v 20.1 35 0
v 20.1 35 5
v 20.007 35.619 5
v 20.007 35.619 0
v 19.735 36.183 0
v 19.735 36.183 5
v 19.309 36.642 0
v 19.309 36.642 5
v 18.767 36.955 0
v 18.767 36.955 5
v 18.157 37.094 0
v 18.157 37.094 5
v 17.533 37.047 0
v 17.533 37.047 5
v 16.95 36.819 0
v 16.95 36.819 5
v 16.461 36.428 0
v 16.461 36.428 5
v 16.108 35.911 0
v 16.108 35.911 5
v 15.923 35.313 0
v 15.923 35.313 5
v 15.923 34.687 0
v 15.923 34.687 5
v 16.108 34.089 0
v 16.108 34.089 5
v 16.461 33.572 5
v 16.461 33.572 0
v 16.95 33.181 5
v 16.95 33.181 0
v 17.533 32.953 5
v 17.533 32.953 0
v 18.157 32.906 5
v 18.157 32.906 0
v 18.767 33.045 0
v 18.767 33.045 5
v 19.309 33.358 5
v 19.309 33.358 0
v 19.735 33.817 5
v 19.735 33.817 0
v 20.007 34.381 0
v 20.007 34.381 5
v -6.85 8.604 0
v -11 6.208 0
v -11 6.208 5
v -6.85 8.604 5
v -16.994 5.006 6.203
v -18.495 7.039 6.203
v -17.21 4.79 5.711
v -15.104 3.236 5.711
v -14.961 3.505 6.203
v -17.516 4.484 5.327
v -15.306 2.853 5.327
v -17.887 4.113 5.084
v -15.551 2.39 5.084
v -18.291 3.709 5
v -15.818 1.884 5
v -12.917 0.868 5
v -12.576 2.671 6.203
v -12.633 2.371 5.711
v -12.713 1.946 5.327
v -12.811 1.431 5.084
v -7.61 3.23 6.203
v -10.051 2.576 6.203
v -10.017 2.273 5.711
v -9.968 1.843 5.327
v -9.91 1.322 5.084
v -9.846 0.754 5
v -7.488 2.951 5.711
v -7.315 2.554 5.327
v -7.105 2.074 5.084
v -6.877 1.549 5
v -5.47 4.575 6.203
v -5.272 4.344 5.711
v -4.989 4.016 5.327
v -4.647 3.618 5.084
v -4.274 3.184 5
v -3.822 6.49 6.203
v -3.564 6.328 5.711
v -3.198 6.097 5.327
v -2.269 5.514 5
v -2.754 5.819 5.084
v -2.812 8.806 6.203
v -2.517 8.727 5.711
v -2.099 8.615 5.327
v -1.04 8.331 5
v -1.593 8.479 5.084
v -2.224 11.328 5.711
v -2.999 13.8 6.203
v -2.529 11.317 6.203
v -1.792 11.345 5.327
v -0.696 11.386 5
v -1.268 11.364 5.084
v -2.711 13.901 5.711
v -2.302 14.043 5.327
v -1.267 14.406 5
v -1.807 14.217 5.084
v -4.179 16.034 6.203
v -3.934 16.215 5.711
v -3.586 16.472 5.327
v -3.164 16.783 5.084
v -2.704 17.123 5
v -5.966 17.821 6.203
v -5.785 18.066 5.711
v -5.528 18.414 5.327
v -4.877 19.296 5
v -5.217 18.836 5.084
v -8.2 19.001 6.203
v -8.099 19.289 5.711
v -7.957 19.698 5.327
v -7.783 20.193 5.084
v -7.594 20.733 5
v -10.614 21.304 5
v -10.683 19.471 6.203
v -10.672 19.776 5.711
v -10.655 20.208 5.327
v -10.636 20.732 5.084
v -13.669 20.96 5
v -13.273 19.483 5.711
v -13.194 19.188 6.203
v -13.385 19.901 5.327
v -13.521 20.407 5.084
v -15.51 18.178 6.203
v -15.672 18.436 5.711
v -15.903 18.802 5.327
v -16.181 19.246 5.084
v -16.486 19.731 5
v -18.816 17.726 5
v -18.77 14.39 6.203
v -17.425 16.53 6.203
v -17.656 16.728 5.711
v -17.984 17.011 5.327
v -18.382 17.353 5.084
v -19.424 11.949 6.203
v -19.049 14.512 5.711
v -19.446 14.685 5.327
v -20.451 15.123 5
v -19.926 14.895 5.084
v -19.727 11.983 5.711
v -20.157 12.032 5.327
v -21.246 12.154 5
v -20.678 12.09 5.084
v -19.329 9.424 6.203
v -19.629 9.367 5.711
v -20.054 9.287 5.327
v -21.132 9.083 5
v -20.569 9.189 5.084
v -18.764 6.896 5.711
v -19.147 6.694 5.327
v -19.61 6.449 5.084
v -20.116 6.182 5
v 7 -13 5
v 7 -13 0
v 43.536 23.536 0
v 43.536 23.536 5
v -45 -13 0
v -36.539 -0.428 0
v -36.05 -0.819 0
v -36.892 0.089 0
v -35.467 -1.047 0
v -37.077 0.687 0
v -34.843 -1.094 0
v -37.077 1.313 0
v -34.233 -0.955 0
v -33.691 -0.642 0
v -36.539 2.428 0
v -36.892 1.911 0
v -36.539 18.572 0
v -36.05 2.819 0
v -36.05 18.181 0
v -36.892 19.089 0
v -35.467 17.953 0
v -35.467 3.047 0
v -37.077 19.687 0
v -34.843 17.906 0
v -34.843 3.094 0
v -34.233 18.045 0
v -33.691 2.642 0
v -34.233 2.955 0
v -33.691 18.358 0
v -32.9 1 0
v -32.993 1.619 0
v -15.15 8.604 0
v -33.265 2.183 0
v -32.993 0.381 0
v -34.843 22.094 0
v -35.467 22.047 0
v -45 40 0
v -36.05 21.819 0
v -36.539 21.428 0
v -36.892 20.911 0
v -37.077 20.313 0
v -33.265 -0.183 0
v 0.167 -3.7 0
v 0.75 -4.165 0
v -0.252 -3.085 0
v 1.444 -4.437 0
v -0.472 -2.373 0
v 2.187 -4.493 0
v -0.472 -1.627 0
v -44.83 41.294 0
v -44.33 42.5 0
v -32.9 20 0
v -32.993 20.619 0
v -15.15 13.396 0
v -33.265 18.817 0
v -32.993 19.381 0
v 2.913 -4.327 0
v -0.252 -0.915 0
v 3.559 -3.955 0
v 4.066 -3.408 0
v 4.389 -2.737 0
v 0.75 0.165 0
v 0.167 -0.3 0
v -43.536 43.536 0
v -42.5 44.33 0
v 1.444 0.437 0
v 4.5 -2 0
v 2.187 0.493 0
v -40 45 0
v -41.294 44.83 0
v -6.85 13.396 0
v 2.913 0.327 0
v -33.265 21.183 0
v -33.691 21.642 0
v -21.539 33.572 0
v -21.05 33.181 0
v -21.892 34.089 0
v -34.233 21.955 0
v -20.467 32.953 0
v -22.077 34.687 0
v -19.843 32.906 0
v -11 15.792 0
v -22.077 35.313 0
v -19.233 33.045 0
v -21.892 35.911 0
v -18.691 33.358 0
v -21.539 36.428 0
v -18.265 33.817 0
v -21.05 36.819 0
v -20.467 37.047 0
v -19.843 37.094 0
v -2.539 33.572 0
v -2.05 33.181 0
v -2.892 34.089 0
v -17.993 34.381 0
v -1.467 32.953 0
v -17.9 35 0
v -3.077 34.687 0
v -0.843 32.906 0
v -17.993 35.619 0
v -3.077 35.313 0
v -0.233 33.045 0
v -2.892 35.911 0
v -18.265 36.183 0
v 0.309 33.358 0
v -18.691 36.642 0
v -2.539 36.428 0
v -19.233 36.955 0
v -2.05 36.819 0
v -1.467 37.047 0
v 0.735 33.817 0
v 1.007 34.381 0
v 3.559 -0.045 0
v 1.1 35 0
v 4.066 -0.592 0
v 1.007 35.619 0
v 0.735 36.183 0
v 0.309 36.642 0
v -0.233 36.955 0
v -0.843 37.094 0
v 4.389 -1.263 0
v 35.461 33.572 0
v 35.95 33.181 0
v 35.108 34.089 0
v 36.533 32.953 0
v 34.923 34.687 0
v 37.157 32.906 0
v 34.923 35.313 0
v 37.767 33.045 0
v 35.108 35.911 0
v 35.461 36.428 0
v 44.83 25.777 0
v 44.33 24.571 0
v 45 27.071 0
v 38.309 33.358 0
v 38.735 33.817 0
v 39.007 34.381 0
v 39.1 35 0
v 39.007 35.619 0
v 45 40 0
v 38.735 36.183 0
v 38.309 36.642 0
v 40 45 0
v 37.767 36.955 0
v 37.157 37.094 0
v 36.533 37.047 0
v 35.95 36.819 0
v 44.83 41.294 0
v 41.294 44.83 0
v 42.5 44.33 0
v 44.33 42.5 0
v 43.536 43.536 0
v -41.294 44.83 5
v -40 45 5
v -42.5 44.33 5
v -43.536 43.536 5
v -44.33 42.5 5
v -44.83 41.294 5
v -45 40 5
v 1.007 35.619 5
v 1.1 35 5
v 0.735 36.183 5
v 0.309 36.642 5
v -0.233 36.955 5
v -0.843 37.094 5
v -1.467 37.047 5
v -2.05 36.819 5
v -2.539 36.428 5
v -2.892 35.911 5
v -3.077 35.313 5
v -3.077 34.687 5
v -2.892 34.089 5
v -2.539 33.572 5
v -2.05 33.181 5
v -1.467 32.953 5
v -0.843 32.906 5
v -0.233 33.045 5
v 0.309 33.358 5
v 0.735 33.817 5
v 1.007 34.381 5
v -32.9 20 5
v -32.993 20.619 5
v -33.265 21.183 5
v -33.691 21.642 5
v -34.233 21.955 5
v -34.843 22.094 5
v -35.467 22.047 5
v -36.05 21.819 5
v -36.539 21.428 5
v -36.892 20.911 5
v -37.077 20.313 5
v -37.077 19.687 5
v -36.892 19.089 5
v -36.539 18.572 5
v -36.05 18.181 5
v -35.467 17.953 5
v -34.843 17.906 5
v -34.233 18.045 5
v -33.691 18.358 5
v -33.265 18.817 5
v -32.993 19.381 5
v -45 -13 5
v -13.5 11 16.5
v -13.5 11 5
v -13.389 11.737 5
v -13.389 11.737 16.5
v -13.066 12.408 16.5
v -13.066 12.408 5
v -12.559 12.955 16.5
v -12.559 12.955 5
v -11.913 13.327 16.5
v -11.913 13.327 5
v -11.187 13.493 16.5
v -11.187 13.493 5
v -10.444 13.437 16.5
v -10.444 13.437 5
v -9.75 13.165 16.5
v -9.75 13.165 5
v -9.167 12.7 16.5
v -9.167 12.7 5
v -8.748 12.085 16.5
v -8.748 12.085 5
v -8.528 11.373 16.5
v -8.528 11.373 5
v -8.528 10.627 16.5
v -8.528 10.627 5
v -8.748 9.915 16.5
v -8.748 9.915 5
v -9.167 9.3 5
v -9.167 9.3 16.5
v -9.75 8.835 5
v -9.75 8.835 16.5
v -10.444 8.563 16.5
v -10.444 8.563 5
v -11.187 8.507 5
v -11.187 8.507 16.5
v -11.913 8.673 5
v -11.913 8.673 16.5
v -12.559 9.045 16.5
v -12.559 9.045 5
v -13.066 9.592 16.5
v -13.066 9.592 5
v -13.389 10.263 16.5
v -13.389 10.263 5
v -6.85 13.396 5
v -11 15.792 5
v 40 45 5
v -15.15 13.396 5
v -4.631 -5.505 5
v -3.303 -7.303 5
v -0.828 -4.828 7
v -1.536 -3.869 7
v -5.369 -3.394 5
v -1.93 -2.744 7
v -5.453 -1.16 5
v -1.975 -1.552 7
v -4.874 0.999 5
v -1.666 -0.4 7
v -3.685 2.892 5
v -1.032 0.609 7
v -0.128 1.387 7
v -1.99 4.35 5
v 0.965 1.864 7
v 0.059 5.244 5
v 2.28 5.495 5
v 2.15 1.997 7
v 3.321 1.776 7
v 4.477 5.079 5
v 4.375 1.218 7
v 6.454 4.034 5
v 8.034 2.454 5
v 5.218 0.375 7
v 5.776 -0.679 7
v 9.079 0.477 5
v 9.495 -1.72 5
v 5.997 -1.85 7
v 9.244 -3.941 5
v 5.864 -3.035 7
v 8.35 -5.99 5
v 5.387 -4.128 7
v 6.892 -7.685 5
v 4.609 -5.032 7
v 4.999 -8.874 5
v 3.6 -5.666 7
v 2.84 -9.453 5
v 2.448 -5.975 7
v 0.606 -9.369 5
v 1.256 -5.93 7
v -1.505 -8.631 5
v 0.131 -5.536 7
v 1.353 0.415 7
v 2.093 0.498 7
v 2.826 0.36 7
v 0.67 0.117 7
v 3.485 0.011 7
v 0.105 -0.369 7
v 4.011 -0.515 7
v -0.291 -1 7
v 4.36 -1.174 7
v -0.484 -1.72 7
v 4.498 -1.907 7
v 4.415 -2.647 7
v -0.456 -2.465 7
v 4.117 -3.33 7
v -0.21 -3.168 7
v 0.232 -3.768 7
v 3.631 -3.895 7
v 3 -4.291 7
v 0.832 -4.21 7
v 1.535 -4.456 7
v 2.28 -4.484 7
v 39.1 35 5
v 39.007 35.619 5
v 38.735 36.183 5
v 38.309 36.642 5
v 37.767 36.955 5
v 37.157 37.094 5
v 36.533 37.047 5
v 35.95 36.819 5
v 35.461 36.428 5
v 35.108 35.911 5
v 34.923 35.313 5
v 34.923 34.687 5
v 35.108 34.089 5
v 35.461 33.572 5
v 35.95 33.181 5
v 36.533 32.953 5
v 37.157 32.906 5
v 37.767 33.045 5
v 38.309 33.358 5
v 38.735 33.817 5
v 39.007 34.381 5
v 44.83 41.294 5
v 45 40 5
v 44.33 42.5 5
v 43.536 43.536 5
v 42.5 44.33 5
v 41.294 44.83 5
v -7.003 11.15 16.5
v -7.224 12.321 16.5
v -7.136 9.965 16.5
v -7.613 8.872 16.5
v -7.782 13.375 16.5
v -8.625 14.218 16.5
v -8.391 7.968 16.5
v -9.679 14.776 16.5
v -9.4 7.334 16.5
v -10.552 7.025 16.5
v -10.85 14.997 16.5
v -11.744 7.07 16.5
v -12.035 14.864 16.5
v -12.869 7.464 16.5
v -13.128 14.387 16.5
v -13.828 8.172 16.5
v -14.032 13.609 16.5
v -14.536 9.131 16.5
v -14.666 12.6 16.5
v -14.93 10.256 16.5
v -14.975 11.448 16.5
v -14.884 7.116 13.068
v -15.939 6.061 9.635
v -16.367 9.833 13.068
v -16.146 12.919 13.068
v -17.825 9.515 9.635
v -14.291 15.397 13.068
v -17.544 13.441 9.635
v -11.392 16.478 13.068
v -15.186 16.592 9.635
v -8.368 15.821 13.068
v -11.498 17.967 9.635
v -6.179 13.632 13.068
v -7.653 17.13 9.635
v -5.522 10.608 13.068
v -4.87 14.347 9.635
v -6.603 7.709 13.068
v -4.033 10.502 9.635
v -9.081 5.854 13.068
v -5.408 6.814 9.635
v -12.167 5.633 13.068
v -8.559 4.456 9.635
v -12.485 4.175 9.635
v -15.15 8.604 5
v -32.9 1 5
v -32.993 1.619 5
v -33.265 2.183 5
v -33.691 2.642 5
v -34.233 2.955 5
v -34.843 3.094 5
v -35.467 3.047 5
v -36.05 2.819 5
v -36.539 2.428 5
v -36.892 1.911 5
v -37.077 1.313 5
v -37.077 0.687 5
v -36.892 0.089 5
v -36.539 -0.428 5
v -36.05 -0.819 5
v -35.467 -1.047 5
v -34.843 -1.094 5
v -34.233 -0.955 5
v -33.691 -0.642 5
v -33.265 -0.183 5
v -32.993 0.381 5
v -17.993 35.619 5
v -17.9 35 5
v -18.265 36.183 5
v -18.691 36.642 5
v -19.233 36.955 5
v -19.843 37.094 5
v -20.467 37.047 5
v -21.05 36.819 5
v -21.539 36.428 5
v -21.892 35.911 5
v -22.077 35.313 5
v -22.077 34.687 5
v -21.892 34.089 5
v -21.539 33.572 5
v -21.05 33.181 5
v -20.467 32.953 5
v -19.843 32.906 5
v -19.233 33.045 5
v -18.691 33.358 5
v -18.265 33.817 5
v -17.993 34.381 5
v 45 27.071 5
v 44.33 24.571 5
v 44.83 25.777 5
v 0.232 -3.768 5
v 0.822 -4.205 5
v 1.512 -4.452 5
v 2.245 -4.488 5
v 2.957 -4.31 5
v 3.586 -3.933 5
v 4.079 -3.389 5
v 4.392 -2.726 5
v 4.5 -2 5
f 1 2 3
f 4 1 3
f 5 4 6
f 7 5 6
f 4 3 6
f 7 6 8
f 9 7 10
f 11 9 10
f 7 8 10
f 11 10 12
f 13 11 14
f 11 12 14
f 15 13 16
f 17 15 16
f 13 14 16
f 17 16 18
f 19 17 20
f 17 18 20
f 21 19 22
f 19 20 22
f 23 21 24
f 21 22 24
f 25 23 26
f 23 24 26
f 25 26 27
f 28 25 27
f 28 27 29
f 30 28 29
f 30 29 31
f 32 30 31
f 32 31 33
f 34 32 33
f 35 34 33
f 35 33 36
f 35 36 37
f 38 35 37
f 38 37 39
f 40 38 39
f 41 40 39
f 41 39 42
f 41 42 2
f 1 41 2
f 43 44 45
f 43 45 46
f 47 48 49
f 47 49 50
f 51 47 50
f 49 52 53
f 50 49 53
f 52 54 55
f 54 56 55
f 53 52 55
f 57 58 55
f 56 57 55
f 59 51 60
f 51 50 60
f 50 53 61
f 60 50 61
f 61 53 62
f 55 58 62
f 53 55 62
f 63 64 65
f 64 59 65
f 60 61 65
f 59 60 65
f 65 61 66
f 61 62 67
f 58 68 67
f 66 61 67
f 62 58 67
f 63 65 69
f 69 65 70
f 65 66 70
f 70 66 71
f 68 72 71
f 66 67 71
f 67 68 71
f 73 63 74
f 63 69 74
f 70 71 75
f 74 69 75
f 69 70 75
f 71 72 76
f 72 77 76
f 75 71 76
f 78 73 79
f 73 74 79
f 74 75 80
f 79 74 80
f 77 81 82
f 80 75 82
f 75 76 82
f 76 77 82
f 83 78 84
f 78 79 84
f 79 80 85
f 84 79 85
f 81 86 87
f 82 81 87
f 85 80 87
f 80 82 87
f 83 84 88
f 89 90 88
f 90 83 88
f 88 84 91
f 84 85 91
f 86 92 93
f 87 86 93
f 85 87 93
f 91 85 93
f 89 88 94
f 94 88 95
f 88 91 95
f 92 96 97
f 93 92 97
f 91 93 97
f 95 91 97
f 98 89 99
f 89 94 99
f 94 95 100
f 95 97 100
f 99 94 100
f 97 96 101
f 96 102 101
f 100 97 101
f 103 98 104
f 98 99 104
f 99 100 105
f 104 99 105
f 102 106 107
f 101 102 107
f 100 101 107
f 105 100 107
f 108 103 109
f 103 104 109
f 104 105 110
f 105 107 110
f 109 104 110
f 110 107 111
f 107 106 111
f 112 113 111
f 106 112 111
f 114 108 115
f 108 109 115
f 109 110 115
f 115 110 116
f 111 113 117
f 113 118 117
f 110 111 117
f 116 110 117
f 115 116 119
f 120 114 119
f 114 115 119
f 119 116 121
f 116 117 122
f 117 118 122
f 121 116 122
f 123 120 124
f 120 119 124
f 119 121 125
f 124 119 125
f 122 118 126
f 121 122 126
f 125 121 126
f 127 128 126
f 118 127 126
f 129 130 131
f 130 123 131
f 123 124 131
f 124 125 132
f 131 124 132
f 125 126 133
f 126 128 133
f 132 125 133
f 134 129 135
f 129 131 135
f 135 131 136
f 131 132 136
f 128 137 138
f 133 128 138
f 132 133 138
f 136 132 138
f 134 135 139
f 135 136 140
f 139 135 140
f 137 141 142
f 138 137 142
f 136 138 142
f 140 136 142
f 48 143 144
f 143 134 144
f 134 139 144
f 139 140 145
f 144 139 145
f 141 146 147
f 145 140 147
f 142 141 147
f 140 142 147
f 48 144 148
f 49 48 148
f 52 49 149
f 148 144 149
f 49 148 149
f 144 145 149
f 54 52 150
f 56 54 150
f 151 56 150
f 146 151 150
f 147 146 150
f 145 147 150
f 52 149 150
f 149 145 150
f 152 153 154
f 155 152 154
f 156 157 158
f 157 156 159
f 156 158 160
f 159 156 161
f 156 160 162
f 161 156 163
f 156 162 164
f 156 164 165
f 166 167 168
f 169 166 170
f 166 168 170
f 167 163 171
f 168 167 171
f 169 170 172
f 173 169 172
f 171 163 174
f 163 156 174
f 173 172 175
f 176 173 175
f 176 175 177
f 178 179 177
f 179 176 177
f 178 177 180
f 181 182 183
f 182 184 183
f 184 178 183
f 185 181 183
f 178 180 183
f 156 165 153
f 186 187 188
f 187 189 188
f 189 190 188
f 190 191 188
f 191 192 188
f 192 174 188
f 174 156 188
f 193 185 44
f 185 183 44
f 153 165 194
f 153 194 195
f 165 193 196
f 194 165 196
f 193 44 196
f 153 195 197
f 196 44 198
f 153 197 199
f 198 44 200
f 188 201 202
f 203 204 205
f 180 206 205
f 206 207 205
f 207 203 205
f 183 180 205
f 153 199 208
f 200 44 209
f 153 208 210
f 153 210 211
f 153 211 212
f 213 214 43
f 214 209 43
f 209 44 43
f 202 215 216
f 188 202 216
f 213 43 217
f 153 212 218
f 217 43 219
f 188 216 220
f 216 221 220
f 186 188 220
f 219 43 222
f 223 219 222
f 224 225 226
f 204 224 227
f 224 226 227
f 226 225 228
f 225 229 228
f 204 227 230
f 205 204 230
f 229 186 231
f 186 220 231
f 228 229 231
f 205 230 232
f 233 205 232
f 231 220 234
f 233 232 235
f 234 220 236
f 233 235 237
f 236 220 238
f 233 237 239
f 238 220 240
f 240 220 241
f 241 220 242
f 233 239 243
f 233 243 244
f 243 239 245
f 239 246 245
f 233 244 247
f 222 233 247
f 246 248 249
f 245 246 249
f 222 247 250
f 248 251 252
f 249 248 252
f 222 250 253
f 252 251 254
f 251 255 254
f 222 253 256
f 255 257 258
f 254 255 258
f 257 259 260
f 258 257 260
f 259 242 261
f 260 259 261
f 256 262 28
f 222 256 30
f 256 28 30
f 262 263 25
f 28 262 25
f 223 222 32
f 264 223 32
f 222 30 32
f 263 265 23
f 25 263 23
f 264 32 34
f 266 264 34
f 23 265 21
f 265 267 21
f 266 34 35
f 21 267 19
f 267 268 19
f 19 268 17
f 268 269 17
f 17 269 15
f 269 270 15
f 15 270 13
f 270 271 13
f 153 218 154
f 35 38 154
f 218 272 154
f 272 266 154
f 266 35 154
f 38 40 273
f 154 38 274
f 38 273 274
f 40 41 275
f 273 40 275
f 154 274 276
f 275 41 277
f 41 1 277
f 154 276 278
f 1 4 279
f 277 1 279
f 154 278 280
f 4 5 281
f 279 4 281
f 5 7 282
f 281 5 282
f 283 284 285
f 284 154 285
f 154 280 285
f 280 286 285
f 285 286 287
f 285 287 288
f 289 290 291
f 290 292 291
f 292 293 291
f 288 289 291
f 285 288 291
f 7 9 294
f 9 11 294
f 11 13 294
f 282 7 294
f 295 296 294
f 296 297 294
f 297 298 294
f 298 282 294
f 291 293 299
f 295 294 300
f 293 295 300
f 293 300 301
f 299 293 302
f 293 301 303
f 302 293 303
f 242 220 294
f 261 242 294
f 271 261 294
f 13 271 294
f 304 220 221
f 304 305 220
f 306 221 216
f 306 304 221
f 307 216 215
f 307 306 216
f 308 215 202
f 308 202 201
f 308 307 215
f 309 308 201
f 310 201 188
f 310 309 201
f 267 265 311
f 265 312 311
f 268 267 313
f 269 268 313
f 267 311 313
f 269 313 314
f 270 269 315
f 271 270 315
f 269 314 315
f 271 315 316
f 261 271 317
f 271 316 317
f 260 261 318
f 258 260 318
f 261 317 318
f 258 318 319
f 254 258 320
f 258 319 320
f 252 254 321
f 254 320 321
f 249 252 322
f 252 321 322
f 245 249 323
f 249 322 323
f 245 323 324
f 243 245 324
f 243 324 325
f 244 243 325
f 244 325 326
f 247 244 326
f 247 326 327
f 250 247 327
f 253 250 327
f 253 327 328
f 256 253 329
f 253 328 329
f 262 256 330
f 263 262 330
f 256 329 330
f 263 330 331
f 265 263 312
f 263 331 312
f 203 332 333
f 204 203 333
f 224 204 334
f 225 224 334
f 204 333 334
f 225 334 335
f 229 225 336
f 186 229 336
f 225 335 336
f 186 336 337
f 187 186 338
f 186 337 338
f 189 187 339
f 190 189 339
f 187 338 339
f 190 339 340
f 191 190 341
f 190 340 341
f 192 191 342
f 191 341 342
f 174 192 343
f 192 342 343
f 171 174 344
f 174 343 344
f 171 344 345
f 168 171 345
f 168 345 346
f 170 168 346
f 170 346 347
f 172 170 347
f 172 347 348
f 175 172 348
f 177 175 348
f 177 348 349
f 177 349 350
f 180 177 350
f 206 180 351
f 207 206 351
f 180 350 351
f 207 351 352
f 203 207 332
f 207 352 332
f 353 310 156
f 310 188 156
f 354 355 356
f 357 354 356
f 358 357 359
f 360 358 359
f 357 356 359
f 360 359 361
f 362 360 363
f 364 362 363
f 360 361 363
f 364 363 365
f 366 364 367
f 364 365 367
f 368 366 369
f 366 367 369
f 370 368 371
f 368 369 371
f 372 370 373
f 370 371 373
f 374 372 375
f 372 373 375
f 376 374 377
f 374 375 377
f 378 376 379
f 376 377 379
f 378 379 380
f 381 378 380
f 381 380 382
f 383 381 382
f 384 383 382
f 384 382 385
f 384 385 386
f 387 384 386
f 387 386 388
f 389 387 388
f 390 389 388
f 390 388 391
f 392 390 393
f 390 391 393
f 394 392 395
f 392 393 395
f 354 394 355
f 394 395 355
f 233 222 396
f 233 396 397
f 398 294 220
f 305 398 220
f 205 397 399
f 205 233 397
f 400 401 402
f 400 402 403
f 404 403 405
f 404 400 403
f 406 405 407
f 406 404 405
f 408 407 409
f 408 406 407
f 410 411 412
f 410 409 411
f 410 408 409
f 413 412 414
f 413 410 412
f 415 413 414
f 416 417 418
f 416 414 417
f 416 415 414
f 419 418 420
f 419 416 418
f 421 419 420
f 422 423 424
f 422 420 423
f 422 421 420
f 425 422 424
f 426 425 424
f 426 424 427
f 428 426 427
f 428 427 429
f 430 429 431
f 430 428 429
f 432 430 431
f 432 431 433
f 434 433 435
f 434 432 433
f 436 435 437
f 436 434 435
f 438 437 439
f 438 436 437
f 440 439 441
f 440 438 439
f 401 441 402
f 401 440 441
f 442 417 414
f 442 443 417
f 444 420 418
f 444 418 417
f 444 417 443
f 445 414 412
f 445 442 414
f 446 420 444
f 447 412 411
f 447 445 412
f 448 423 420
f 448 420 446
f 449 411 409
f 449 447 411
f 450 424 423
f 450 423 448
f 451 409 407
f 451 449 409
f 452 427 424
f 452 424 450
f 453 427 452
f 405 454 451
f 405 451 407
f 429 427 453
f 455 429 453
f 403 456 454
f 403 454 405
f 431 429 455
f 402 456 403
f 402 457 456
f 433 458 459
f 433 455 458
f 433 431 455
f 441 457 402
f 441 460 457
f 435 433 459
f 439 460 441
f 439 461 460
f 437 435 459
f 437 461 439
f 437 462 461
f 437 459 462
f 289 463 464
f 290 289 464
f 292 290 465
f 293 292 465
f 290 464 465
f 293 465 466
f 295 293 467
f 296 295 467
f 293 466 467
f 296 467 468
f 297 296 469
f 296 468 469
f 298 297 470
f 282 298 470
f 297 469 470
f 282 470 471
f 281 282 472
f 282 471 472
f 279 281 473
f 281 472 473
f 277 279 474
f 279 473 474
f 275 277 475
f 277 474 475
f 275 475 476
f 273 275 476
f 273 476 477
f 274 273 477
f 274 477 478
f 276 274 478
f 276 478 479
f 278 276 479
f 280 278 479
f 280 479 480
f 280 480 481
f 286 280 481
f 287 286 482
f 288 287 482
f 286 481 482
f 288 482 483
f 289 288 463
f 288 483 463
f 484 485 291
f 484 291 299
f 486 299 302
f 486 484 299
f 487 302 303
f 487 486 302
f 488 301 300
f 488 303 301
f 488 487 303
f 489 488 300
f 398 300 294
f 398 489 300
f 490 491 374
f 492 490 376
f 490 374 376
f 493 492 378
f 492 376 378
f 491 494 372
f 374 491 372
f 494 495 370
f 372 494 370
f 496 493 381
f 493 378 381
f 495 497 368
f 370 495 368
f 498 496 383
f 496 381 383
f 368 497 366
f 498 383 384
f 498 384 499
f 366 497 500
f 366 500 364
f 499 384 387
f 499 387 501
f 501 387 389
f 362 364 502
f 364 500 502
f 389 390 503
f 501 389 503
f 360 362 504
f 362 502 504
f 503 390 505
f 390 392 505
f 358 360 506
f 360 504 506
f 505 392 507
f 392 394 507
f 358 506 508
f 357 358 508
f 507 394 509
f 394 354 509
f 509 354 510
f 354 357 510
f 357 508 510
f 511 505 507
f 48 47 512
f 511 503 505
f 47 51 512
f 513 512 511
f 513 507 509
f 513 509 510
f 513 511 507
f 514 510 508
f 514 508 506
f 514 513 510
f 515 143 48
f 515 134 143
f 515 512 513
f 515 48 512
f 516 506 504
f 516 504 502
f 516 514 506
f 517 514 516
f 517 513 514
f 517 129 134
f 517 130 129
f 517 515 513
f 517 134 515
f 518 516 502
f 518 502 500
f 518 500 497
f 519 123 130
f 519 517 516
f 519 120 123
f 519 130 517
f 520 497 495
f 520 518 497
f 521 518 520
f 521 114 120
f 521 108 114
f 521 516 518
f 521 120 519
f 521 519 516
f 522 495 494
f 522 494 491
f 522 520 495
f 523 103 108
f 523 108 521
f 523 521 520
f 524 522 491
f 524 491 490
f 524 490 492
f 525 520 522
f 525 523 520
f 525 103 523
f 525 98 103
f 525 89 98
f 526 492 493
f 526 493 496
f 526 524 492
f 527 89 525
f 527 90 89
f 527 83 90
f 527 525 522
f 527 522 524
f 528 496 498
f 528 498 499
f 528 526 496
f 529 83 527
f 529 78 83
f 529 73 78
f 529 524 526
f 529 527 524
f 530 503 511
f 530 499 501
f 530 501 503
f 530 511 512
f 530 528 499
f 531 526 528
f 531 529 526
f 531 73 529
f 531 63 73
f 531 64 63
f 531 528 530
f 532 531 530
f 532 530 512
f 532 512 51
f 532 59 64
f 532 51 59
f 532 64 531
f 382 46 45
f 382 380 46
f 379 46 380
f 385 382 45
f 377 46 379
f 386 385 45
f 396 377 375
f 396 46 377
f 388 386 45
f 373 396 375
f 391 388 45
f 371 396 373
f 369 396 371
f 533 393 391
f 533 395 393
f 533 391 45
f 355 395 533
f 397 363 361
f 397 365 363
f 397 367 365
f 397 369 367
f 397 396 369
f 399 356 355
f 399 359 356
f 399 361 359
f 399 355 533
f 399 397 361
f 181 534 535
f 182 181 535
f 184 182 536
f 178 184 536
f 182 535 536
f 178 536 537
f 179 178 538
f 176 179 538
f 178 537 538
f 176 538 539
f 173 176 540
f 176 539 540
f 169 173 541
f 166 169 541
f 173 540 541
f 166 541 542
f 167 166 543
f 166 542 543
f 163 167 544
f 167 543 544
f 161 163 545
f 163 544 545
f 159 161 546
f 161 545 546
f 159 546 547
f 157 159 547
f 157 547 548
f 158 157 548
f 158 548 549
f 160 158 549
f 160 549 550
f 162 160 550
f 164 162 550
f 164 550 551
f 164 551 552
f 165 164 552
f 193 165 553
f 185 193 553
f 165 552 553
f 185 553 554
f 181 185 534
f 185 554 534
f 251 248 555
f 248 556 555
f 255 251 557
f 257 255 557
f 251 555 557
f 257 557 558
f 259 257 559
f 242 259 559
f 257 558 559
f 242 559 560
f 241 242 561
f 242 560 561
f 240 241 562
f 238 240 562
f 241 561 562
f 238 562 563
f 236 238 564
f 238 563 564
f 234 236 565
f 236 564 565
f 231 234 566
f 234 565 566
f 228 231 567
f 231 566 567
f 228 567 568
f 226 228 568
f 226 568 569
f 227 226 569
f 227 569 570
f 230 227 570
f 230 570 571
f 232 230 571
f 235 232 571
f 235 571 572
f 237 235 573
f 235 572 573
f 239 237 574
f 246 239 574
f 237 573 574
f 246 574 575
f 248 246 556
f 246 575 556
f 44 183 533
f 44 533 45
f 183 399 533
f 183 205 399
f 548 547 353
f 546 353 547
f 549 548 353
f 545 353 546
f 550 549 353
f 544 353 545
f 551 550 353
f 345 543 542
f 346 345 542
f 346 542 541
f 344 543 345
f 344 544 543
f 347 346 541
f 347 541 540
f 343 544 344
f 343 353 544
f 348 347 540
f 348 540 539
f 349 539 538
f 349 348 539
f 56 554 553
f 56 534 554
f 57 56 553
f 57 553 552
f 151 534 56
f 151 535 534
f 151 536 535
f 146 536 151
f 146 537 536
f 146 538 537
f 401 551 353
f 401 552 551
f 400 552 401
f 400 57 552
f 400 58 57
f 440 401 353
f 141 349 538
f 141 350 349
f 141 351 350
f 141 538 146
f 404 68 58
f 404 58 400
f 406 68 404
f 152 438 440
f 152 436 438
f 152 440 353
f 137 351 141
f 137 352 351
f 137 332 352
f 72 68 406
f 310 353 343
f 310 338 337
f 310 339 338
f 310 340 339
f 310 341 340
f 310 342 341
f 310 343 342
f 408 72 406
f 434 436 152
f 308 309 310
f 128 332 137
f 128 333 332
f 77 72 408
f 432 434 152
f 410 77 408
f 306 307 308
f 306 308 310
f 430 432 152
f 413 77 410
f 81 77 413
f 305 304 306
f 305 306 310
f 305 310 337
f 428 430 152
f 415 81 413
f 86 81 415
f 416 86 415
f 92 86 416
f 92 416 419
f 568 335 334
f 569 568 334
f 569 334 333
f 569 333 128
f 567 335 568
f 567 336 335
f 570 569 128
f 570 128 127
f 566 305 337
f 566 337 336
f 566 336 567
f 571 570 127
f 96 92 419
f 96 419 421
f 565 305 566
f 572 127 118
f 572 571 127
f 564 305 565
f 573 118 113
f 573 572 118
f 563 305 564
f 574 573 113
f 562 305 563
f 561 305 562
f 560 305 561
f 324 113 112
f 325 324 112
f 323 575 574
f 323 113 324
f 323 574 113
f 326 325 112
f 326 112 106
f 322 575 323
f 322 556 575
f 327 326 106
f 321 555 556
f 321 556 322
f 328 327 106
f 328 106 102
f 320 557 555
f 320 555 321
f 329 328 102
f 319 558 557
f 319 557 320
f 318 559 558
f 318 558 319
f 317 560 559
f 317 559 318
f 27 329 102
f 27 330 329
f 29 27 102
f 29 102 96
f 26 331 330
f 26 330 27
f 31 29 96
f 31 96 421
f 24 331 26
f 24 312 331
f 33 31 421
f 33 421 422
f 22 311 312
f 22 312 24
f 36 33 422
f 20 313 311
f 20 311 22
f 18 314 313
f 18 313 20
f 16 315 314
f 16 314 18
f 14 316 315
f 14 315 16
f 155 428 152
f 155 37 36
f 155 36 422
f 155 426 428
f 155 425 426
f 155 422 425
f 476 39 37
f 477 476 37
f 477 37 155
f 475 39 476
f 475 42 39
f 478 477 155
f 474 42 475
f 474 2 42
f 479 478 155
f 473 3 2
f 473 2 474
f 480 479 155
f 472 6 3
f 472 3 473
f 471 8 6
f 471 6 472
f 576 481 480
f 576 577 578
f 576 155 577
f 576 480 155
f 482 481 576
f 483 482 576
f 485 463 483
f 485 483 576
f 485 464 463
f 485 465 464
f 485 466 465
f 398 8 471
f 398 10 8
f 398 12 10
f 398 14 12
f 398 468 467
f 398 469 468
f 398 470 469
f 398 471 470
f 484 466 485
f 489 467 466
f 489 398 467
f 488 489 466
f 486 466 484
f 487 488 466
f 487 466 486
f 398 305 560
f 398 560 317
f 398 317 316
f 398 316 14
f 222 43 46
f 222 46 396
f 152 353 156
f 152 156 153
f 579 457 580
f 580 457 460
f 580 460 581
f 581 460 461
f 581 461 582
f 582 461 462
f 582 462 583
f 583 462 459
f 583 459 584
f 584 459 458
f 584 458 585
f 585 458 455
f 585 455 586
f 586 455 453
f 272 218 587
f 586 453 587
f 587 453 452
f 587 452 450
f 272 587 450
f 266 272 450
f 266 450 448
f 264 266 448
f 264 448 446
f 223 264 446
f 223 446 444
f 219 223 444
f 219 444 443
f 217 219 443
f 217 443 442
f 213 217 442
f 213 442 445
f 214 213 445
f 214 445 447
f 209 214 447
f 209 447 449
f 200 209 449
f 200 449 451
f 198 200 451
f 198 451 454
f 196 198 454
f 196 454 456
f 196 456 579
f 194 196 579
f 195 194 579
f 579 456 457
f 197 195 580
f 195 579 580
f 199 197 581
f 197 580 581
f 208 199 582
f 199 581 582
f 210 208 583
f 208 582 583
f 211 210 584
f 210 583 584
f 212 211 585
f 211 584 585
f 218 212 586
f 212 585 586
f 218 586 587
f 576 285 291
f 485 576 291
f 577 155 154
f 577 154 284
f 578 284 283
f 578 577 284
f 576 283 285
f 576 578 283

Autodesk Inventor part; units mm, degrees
ref_plane "YZ Plane" through (0, 0, 0) normal (1, 0, 0) x (0, 1, 0)
ref_plane "XZ Plane" through (0, 0, 0) normal (0, 1, 0) x (-1, 0, 0)
ref_plane "XY Plane" through (0, 0, 0) normal (0, 0, 1) x (1, 0, 0)
sketch "Sketch1" plane through (0, 0, 0) normal (0, 0, 1) x (1, 0, 0)
  line L0 (-45, 45) -> (-45, -45)
  line L1 (-45, -45) -> (-25, -45)
  line L2 (-25, -45) -> (45, 25)
  line L3 (45, 25) -> (45, 45)
  line L4 (45, 45) -> (-45, 45)
  point P0 (0, 0)
  point P1 (0, 45)
  point P2 (-45, 0)
  dimension "d0" = 20
  dimension "d1" = 20
  dimension "d2" = 90
  dimension "d3" = 90
extrude "Extrusion1" add sketch "Sketch1" along normal blind 5
sketch "Sketch2" plane through (0, 0, 5) normal (0, 0, 1) x (1, 0, 0)
  circle A0 centre (-11, 11) radius 2.5
  circle A1 centre (2, -2) radius 2.5
  line L0 (-25, -45) -> (45, 25) projected
  line L1 (45, 45) -> (-45, 45) projected
  line L2 (10, -10) -> (-45, 45) construction
  line L3 (-45, 45) -> (-45, -45) projected
  point P0 (0, 0)
  dimension "d6" = 5
  dimension "d7" = 34
  dimension "d8" = 13
extrude "Extrusion2" cut sketch "Sketch2" against normal blind 6
ref_plane "Work Plane2" through (-11, 11, 5) normal (0.7071, -0.7071, 0) x (0.7071, 0.7071, 0)
ref_plane "Work Plane1" through (-9.2322, 9.2322, 5) normal (0.7071, -0.7071, 0) x (0.7071, 0.7071, 0)
sketch "Sketch3" plane through (-11, 11, 5) normal (0.7071, -0.7071, 0) x (0.7071, 0.7071, 0)
  line L0 (-49.4975, 0) -> (49.4975, 0) projected
  line L1 (0, 11.5) -> (0, 0)
  line L2 (-9, 0) -> (0, 0)
  line L3 (-9, 0) -> (-4, 11.5)
  line L4 (-4, 11.5) -> (0, 11.5)
  point P0 (0, -5)
  dimension "d12" = 9
  dimension "d13" = 11.5
  dimension "d17" = 4
revolve "Revolution1" add sketch "Sketch3" angle 360 about axis through (-11, 11, 16.5) along (0, 0, -1)
sketch "Sketch4" plane through (-11, 11, 5) normal (0, 0, -1) x (-1, 0, 0)
  circle A0 centre (0, 0) radius 2.5 projected
  point P0 (-11, -11)
extrude "Extrusion3" cut sketch "Sketch4" against normal up to next
sketch "Sketch5" plane through (0, 0, 5) normal (0, 0, 1) x (1, 0, 0)
  circle A0 centre (-35, -37) radius 2.1
  circle A1 centre (-35, -18) radius 2.1
  circle A2 centre (-35, 20) radius 2.1
  circle A3 centre (-20, 35) radius 2.1
  circle A4 centre (-1, 35) radius 2.1
  circle A5 centre (18, 35) radius 2.1
  circle A6 centre (37, 35) radius 2.1
  line L0 (-45, -45) -> (-25, -45) projected
  line L1 (45, 25) -> (45, 45) projected
  circle A7 centre (-35, 1) radius 2.1
  point P0 (0, 0)
  point P1 (45, 35)
  point P2 (-35, -45)
  point P3 (-35, -45)
  point P4 (-35, -45)
  dimension "d18" = 4.2
  dimension "d19" = 8
  dimension "d20" = 19
  dimension "d21" = 19
  dimension "d22" = 19
  dimension "d23" = 8
  dimension "d24" = 19
  dimension "d25" = 19
  dimension "d26" = 19
extrude "Extrusion4" cut sketch "Sketch5" against normal up to next
fillet "Fillet1" radius 2 1 edges at (-4.636, 17.364, 5)
sketch "Sketch7" plane through (0, 0, 0) normal (0, 0, -1) x (-1, 0, 0)
  line L0 (15.15, 13.396) -> (15.15, 8.604)
  line L1 (15.15, 8.604) -> (11, 6.208)
  line L2 (11, 6.208) -> (6.85, 8.604)
  line L3 (6.85, 8.604) -> (6.85, 13.396)
  line L4 (6.85, 13.396) -> (11, 15.792)
  line L5 (11, 15.792) -> (15.15, 13.396)
  circle A0 centre (11, 11) radius 2.5 projected
  circle A1 centre (11, 11) radius 4.15 construction
  point P0 (0, 0)
  point P1 (15.15, 11)
  dimension "d30" = 8.3
  dimension "d32" = 8.3
extrude "Extrusion5" cut sketch "Sketch7" against normal blind 5
ref_plane "Work Plane4" through (2, -2, 5) normal (0.7071, -0.7071, 0) x (0.7071, 0.7071, 0)
ref_plane "Work Plane3" through (0.2322, -0.2322, 5) normal (0.7071, -0.7071, 0) x (0.7071, 0.7071, 0)
sketch "Sketch8" plane through (2, -2, 5) normal (0.7071, -0.7071, 0) x (0.7071, 0.7071, 0)
  line L0 (2.5, -5) -> (-2.5, -5) projected
  line L1 (-2.5, 0) -> (2.5, 0) projected
  line L2 (-2.5, 0) -> (2.5, 0) projected
  line L3 (-2.5, 0) -> (-7.5, 0)
  line L4 (-7.5, 0) -> (-4, 2)
  line L5 (-4, 2) -> (-2.5, 2)
  line L6 (-2.5, 0) -> (-2.5, 2)
  line L7 (0, 0) -> (0, 4.1579) construction
  point P0 (0, -5)
  dimension "d36" = 5
  dimension "d37" = 1.5
  dimension "d38" = 2
revolve "Revolution2" add sketch "Sketch8" angle 360 about axis through (2, -2, 5) along (0, 0, 1)
fillet "Fillet2" radius 5 5 edges at (-25, -45, 2.5) (-45, -45, 2.5) (45, 25, 2.5) (45, 45, 2.5) (-45, 45, 2.5)
sketch "Sketch9" plane through (0, 0, 5) normal (0, 0, 1) x (1, 0, 0)
  line L0 (-45, 40) -> (-45, -40) projected
  line L1 (-45, -13) -> (14.9089, -13)
  line L2 (14.9089, -13) -> (14.9089, -45)
  line L3 (14.9089, -45) -> (-45, -45)
  line L4 (-45, -45) -> (-45, -13)
  arc A0 (-27.0711, -45) -> (-23.5355, -43.5355) centre (-27.0711, -40) ccw projected
  point P0 (0, 0)
  point P1 (-25.1577, -44.6194)
  dimension "d44" = 32
extrude "Extrusion6" cut sketch "Sketch9" against normal up to next
equation "\"d21\" = d20"
equation "\"d22\" = d20"
equation "\"d23\" = d19"
equation "\"d24\" = d20"
equation "\"d25\" = d20"
equation "\"d26\" = d20"
properties part number "bracket-GT2-left"
